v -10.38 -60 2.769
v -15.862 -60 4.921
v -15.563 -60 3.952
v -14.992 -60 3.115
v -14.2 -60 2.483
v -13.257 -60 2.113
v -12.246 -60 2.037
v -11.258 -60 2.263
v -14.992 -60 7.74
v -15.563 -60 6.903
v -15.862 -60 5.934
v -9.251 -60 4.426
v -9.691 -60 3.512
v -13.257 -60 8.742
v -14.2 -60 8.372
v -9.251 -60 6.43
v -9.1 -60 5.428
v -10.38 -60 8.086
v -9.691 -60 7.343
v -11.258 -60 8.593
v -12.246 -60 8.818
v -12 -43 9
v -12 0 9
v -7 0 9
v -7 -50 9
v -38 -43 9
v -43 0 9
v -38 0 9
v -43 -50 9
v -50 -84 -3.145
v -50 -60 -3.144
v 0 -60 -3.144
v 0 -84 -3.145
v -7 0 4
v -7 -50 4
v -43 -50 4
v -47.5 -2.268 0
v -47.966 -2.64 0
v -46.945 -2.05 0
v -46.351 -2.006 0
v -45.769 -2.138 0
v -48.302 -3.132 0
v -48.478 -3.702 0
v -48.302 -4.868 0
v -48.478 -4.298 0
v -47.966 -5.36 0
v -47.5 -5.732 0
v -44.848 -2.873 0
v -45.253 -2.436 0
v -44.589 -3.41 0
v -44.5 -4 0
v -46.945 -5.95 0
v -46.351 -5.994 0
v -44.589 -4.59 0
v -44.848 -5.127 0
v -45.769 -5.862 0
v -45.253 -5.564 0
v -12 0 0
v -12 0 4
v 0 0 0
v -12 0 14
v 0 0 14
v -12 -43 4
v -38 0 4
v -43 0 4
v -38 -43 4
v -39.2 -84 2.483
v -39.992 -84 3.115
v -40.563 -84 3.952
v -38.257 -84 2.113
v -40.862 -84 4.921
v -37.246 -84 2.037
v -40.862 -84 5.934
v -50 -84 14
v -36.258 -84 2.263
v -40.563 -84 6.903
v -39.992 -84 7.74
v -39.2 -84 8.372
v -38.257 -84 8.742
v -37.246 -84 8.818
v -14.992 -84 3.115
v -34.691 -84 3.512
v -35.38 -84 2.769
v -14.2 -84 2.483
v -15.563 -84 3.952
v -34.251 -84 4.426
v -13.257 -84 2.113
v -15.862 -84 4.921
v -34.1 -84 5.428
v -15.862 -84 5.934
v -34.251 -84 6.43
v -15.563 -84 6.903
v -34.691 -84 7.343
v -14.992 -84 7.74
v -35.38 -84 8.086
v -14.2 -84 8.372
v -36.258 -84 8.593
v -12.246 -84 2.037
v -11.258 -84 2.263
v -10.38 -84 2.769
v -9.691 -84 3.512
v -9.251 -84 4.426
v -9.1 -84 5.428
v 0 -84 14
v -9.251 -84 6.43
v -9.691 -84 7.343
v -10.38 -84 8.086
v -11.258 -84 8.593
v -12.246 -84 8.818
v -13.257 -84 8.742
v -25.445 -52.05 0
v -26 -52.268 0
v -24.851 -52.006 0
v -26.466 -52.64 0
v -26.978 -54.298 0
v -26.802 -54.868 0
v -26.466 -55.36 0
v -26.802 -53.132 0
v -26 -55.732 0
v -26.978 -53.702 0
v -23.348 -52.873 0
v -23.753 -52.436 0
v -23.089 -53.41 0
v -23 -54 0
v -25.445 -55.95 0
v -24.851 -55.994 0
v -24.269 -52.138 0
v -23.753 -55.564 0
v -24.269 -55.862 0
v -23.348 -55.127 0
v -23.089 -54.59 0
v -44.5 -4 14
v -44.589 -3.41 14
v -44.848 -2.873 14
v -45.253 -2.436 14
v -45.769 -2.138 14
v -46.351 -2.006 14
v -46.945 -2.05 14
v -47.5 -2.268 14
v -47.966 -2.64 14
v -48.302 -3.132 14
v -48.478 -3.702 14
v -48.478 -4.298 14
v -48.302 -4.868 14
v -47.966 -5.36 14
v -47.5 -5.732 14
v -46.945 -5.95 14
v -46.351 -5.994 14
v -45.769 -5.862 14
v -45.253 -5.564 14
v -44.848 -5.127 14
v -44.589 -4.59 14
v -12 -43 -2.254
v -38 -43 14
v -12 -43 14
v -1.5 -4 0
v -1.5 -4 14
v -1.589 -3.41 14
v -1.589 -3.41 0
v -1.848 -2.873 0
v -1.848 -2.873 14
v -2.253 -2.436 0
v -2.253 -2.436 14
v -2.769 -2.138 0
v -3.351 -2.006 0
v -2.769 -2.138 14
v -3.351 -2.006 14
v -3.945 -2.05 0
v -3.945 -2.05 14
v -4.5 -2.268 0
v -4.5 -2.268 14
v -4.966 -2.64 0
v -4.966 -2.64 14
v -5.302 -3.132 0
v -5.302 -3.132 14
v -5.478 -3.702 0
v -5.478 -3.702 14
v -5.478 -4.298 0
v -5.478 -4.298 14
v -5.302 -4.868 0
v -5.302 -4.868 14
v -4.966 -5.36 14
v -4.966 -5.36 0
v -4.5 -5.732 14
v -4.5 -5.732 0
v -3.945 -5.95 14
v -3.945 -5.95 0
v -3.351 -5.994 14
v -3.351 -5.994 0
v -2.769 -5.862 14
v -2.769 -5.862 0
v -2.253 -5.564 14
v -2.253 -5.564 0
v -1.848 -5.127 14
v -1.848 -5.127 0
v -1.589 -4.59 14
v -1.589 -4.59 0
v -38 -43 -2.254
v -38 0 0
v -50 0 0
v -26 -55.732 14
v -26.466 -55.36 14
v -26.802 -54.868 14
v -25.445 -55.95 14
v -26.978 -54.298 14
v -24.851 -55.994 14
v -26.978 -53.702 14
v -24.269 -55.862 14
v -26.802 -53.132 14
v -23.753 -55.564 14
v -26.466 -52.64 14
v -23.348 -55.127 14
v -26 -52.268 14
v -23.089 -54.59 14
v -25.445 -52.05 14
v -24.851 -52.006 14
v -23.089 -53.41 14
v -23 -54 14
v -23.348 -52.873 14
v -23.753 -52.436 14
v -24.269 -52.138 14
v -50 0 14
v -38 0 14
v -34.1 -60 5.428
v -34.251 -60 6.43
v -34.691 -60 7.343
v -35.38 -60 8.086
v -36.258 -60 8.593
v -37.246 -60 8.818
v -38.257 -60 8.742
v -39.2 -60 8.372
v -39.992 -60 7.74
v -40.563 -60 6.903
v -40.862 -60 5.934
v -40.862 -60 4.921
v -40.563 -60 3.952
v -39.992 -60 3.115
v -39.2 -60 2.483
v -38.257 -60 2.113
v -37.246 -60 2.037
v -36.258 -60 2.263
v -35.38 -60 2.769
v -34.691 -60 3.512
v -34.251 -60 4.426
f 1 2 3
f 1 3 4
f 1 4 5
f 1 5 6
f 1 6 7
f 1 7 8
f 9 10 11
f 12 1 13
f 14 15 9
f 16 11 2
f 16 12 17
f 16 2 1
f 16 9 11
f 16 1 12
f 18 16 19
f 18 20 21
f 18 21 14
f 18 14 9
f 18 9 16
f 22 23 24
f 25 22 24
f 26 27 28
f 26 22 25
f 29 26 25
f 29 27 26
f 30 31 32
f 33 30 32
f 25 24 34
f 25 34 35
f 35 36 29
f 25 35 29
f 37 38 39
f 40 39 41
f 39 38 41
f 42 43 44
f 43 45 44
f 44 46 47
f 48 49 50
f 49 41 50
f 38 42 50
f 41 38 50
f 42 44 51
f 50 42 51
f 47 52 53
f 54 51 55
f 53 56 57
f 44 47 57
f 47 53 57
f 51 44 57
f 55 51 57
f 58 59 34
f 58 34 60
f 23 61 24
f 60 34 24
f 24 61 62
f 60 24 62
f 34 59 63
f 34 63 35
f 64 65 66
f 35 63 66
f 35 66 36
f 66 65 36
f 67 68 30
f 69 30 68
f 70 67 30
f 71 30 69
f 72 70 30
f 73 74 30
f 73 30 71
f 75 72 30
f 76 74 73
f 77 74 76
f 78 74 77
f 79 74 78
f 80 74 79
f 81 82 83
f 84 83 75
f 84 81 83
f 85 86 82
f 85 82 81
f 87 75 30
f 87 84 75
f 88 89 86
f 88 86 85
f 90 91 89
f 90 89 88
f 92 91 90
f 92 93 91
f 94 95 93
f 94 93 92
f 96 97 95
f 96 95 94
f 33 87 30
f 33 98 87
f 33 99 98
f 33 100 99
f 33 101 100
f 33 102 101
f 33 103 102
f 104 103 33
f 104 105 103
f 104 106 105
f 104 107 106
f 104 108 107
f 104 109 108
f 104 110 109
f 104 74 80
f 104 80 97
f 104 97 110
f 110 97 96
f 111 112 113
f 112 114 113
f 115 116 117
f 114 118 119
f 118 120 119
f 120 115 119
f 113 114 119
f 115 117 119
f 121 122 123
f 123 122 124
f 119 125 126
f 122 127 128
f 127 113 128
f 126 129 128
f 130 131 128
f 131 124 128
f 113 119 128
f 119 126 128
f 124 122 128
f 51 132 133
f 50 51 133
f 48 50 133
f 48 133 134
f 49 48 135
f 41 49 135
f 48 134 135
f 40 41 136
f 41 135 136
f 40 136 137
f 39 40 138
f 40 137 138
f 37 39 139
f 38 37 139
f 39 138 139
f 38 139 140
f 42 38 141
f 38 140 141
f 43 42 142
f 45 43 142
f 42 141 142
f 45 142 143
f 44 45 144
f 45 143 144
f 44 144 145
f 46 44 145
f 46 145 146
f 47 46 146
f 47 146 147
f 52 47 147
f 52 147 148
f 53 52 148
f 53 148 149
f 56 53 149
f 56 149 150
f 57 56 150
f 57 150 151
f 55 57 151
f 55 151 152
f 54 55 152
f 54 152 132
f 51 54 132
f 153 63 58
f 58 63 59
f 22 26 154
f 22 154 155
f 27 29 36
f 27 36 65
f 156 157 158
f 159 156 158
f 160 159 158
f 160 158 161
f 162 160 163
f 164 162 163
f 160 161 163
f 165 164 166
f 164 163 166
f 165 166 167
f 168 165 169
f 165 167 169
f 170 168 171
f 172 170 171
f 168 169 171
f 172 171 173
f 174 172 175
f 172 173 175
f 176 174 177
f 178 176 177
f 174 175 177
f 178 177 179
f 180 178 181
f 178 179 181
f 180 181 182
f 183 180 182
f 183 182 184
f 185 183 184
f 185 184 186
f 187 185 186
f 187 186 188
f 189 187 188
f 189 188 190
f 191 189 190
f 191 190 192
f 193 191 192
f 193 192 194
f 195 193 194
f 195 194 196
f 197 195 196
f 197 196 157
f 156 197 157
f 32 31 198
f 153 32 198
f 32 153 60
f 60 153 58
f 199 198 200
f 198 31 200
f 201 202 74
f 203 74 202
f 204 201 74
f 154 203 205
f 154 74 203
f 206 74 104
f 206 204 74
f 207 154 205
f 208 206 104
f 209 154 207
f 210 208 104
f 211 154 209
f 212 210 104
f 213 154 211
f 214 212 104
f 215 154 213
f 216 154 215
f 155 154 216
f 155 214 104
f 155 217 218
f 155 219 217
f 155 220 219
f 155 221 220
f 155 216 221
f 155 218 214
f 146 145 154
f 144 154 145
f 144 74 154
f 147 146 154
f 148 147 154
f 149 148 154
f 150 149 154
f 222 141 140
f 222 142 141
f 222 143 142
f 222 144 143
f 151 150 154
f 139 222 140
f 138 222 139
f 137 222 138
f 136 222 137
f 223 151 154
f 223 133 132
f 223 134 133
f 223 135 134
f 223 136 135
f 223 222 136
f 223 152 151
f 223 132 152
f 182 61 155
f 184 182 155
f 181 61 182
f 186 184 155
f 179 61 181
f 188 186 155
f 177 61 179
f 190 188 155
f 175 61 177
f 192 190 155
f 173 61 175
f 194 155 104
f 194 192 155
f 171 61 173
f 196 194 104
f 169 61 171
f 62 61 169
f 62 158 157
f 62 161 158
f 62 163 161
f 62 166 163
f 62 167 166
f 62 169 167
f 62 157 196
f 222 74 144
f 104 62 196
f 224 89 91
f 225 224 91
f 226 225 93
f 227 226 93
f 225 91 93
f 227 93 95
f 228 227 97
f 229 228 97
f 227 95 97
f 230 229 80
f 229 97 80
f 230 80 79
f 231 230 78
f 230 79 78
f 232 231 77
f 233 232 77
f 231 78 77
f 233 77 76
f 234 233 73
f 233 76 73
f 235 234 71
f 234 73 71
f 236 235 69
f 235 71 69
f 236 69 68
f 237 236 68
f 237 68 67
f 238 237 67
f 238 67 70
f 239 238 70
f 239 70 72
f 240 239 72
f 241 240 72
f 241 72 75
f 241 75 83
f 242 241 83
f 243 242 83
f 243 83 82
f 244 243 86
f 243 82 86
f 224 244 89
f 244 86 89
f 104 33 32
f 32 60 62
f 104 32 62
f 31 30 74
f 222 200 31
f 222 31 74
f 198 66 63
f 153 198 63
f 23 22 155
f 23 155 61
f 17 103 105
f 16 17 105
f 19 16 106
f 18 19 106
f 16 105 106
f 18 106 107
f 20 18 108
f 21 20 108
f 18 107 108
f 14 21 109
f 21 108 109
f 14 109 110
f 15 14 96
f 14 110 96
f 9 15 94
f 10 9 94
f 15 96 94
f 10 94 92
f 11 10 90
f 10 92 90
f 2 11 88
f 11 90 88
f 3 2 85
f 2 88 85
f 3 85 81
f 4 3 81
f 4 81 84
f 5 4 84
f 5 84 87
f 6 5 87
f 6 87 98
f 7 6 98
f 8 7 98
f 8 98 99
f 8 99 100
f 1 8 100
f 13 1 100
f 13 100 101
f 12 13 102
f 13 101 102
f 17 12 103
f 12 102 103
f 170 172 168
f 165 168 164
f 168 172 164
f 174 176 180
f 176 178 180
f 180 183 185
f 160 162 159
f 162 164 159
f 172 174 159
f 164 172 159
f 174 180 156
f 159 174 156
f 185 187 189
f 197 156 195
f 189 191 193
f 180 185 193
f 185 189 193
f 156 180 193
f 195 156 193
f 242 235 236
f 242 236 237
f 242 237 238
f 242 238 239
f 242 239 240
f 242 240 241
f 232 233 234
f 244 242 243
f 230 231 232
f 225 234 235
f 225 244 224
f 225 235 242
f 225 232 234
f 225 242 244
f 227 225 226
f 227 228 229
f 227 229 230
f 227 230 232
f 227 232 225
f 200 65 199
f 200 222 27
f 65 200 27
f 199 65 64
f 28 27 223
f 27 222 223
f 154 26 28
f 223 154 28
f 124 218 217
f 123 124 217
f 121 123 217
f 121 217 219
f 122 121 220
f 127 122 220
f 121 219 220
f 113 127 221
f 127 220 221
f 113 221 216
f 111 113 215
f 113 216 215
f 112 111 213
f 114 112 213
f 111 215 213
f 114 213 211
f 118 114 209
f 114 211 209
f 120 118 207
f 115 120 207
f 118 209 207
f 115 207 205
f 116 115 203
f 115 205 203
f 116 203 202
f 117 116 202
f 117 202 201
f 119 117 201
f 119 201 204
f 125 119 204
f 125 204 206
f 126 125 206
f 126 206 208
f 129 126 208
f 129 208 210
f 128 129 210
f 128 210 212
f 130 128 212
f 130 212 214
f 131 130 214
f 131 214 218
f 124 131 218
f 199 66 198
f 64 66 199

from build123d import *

# Parameters (mm, degrees)
SKETCH_W        = 50
SKETCH_H        = 60
PAD_DEPTH       = 4
SKETCH001_W     = 26
SKETCH001_H     = 26
POCKET_DEPTH    = 5
SKETCH003_W     = 50
SKETCH003_H     = 17
PAD001_DEPTH    = 10
SKETCH004_W     = 12
SKETCH004_H     = 43
PAD002_DEPTH    = 10
SKETCH005_W     = 12
SKETCH005_H     = 43
PAD003_DEPTH    = 10
SKETCH006_W     = 50
SKETCH006_H     = 5
POCKET001_DEPTH = 5
SKETCH007_W     = 50
SKETCH007_H     = 5
POCKET002_DEPTH = 5
SKETCH008_W     = 26
SKETCH008_H     = 5
POCKET003_DEPTH = 7
SKETCH009_R     = 2
POCKET004_DEPTH = 15
SKETCH010_R     = 2
POCKET005_DEPTH = 15
SKETCH011_R     = 2
POCKET006_DEPTH = 15
SKETCH014_W     = 26
SKETCH014_H     = 17
POCKET008_DEPTH = 5
SKETCH015_W     = 50
SKETCH015_H     = 60
PAD005_DEPTH    = 3.1445
POCKET009_DEPTH = 50
SKETCH018_W     = 26
SKETCH018_H     = 43
POCKET010_DEPTH = 5
SKETCH019_W     = 50
SKETCH019_H     = 17.1445
PAD006_DEPTH    = 24
SKETCH020_R     = 3.4
POCKET011_DEPTH = 24
SKETCH021_R     = 3.4
POCKET012_DEPTH = 24


with BuildPart() as part:
    # Sketch → Pad (new body)
    with BuildSketch(Plane.XY):
        with Locations((-25, -30)):
            Rectangle(SKETCH_W, SKETCH_H)
    extrude(amount=PAD_DEPTH)

    # Sketch001 → Pocket (cut)
    with BuildSketch(Plane.XY.offset(4)):
        with Locations((-25, -30)):
            Rectangle(SKETCH001_W, SKETCH001_H)
    extrude(amount=-POCKET_DEPTH, mode=Mode.SUBTRACT)

    # Sketch003 → Pad001 (new body)
    with BuildSketch(Plane.XY.offset(4)):
        with Locations((-25, -51.5)):
            Rectangle(SKETCH003_W, SKETCH003_H)
    extrude(amount=PAD001_DEPTH)

    # Sketch004 → Pad002 (new body)
    with BuildSketch(Plane.XY.offset(4)):
        with Locations((-44, -21.5)):
            Rectangle(SKETCH004_W, SKETCH004_H)
    extrude(amount=PAD002_DEPTH)

    # Sketch005 → Pad003 (new body)
    with BuildSketch(Plane.XY.offset(4)):
        with Locations((-6, -21.5)):
            Rectangle(SKETCH005_W, SKETCH005_H)
    extrude(amount=PAD003_DEPTH)

    # Sketch006 → Pocket001 (cut)
    with BuildSketch(Plane.YZ.offset(-38)):
        with Locations((-25, 6.5)):
            Rectangle(SKETCH006_W, SKETCH006_H)
    extrude(amount=-POCKET001_DEPTH, mode=Mode.SUBTRACT)

    # Sketch007 → Pocket002 (cut)
    with BuildSketch(Plane(origin=(-12, 0, 0), x_dir=(0, -1, 0), z_dir=(-1, 0, 0))):
        with Locations((25, 6.5)):
            Rectangle(SKETCH007_W, SKETCH007_H)
    extrude(amount=-POCKET002_DEPTH, mode=Mode.SUBTRACT)

    # Sketch008 → Pocket003 (cut)
    with BuildSketch(Plane(origin=(0, -43, 0), x_dir=(-1, 0, 0), z_dir=(0, 1, 0))):
        with Locations((25, 6.5)):
            Rectangle(SKETCH008_W, SKETCH008_H)
    extrude(amount=-POCKET003_DEPTH, mode=Mode.SUBTRACT)

    # Sketch009 → Pocket004 (cut)
    with BuildSketch(Plane.XY.offset(14)):
        with Locations((-25, -54)):
            Circle(SKETCH009_R)
    extrude(amount=-POCKET004_DEPTH, mode=Mode.SUBTRACT)

    # Sketch010 → Pocket005 (cut)
    with BuildSketch(Plane.XY.offset(14)):
        with Locations((-46.5, -4)):
            Circle(SKETCH010_R)
    extrude(amount=-POCKET005_DEPTH, mode=Mode.SUBTRACT)

    # Sketch011 → Pocket006 (cut)
    with BuildSketch(Plane.XY.offset(14)):
        with Locations((-3.5, -4)):
            Circle(SKETCH011_R)
    extrude(amount=-POCKET006_DEPTH, mode=Mode.SUBTRACT)

    # Sketch014 → Pocket008 (cut)
    with BuildSketch(Plane.XY.offset(4)):
        with Locations((-25, -8.5)):
            Rectangle(SKETCH014_W, SKETCH014_H)
    extrude(amount=-POCKET008_DEPTH, mode=Mode.SUBTRACT)

    # Sketch015 → Pad005 (new body)
    with BuildSketch(Plane(origin=(0, 0, 0), x_dir=(1, 0, 0), z_dir=(0, 0, -1))):
        with Locations((-25, 30)):
            Rectangle(SKETCH015_W, SKETCH015_H)
    extrude(amount=PAD005_DEPTH)

    # Sketch017 → Pocket009 (cut)
    with BuildSketch(Plane(origin=(-50, 0, 0), x_dir=(0, -1, 0), z_dir=(-1, 0, 0))):
        Polygon((0, 0), (0, -3.1445), (60, -3.1445), align=None)
    extrude(amount=-POCKET009_DEPTH, mode=Mode.SUBTRACT)

    # Sketch018 → Pocket010 (cut)
    with BuildSketch(Plane.XY):
        with Locations((-25, -21.5)):
            Rectangle(SKETCH018_W, SKETCH018_H)
    extrude(amount=-POCKET010_DEPTH, mode=Mode.SUBTRACT)

    # Sketch019 → Pad006 (new body)
    with BuildSketch(Plane.XZ.offset(60)):
        with Locations((-25, 5.42775)):
            Rectangle(SKETCH019_W, SKETCH019_H)
    extrude(amount=PAD006_DEPTH)

    # Sketch020 → Pocket011 (cut)
    with BuildSketch(Plane.XZ.offset(84)):
        with Locations((-37.5, 5.4277)):
            Circle(SKETCH020_R)
    extrude(amount=-POCKET011_DEPTH, mode=Mode.SUBTRACT)

    # Sketch021 → Pocket012 (cut)
    with BuildSketch(Plane.XZ.offset(84)):
        with Locations((-12.5, 5.4277)):
            Circle(SKETCH021_R)
    extrude(amount=-POCKET012_DEPTH, mode=Mode.SUBTRACT)


solid = part.part
